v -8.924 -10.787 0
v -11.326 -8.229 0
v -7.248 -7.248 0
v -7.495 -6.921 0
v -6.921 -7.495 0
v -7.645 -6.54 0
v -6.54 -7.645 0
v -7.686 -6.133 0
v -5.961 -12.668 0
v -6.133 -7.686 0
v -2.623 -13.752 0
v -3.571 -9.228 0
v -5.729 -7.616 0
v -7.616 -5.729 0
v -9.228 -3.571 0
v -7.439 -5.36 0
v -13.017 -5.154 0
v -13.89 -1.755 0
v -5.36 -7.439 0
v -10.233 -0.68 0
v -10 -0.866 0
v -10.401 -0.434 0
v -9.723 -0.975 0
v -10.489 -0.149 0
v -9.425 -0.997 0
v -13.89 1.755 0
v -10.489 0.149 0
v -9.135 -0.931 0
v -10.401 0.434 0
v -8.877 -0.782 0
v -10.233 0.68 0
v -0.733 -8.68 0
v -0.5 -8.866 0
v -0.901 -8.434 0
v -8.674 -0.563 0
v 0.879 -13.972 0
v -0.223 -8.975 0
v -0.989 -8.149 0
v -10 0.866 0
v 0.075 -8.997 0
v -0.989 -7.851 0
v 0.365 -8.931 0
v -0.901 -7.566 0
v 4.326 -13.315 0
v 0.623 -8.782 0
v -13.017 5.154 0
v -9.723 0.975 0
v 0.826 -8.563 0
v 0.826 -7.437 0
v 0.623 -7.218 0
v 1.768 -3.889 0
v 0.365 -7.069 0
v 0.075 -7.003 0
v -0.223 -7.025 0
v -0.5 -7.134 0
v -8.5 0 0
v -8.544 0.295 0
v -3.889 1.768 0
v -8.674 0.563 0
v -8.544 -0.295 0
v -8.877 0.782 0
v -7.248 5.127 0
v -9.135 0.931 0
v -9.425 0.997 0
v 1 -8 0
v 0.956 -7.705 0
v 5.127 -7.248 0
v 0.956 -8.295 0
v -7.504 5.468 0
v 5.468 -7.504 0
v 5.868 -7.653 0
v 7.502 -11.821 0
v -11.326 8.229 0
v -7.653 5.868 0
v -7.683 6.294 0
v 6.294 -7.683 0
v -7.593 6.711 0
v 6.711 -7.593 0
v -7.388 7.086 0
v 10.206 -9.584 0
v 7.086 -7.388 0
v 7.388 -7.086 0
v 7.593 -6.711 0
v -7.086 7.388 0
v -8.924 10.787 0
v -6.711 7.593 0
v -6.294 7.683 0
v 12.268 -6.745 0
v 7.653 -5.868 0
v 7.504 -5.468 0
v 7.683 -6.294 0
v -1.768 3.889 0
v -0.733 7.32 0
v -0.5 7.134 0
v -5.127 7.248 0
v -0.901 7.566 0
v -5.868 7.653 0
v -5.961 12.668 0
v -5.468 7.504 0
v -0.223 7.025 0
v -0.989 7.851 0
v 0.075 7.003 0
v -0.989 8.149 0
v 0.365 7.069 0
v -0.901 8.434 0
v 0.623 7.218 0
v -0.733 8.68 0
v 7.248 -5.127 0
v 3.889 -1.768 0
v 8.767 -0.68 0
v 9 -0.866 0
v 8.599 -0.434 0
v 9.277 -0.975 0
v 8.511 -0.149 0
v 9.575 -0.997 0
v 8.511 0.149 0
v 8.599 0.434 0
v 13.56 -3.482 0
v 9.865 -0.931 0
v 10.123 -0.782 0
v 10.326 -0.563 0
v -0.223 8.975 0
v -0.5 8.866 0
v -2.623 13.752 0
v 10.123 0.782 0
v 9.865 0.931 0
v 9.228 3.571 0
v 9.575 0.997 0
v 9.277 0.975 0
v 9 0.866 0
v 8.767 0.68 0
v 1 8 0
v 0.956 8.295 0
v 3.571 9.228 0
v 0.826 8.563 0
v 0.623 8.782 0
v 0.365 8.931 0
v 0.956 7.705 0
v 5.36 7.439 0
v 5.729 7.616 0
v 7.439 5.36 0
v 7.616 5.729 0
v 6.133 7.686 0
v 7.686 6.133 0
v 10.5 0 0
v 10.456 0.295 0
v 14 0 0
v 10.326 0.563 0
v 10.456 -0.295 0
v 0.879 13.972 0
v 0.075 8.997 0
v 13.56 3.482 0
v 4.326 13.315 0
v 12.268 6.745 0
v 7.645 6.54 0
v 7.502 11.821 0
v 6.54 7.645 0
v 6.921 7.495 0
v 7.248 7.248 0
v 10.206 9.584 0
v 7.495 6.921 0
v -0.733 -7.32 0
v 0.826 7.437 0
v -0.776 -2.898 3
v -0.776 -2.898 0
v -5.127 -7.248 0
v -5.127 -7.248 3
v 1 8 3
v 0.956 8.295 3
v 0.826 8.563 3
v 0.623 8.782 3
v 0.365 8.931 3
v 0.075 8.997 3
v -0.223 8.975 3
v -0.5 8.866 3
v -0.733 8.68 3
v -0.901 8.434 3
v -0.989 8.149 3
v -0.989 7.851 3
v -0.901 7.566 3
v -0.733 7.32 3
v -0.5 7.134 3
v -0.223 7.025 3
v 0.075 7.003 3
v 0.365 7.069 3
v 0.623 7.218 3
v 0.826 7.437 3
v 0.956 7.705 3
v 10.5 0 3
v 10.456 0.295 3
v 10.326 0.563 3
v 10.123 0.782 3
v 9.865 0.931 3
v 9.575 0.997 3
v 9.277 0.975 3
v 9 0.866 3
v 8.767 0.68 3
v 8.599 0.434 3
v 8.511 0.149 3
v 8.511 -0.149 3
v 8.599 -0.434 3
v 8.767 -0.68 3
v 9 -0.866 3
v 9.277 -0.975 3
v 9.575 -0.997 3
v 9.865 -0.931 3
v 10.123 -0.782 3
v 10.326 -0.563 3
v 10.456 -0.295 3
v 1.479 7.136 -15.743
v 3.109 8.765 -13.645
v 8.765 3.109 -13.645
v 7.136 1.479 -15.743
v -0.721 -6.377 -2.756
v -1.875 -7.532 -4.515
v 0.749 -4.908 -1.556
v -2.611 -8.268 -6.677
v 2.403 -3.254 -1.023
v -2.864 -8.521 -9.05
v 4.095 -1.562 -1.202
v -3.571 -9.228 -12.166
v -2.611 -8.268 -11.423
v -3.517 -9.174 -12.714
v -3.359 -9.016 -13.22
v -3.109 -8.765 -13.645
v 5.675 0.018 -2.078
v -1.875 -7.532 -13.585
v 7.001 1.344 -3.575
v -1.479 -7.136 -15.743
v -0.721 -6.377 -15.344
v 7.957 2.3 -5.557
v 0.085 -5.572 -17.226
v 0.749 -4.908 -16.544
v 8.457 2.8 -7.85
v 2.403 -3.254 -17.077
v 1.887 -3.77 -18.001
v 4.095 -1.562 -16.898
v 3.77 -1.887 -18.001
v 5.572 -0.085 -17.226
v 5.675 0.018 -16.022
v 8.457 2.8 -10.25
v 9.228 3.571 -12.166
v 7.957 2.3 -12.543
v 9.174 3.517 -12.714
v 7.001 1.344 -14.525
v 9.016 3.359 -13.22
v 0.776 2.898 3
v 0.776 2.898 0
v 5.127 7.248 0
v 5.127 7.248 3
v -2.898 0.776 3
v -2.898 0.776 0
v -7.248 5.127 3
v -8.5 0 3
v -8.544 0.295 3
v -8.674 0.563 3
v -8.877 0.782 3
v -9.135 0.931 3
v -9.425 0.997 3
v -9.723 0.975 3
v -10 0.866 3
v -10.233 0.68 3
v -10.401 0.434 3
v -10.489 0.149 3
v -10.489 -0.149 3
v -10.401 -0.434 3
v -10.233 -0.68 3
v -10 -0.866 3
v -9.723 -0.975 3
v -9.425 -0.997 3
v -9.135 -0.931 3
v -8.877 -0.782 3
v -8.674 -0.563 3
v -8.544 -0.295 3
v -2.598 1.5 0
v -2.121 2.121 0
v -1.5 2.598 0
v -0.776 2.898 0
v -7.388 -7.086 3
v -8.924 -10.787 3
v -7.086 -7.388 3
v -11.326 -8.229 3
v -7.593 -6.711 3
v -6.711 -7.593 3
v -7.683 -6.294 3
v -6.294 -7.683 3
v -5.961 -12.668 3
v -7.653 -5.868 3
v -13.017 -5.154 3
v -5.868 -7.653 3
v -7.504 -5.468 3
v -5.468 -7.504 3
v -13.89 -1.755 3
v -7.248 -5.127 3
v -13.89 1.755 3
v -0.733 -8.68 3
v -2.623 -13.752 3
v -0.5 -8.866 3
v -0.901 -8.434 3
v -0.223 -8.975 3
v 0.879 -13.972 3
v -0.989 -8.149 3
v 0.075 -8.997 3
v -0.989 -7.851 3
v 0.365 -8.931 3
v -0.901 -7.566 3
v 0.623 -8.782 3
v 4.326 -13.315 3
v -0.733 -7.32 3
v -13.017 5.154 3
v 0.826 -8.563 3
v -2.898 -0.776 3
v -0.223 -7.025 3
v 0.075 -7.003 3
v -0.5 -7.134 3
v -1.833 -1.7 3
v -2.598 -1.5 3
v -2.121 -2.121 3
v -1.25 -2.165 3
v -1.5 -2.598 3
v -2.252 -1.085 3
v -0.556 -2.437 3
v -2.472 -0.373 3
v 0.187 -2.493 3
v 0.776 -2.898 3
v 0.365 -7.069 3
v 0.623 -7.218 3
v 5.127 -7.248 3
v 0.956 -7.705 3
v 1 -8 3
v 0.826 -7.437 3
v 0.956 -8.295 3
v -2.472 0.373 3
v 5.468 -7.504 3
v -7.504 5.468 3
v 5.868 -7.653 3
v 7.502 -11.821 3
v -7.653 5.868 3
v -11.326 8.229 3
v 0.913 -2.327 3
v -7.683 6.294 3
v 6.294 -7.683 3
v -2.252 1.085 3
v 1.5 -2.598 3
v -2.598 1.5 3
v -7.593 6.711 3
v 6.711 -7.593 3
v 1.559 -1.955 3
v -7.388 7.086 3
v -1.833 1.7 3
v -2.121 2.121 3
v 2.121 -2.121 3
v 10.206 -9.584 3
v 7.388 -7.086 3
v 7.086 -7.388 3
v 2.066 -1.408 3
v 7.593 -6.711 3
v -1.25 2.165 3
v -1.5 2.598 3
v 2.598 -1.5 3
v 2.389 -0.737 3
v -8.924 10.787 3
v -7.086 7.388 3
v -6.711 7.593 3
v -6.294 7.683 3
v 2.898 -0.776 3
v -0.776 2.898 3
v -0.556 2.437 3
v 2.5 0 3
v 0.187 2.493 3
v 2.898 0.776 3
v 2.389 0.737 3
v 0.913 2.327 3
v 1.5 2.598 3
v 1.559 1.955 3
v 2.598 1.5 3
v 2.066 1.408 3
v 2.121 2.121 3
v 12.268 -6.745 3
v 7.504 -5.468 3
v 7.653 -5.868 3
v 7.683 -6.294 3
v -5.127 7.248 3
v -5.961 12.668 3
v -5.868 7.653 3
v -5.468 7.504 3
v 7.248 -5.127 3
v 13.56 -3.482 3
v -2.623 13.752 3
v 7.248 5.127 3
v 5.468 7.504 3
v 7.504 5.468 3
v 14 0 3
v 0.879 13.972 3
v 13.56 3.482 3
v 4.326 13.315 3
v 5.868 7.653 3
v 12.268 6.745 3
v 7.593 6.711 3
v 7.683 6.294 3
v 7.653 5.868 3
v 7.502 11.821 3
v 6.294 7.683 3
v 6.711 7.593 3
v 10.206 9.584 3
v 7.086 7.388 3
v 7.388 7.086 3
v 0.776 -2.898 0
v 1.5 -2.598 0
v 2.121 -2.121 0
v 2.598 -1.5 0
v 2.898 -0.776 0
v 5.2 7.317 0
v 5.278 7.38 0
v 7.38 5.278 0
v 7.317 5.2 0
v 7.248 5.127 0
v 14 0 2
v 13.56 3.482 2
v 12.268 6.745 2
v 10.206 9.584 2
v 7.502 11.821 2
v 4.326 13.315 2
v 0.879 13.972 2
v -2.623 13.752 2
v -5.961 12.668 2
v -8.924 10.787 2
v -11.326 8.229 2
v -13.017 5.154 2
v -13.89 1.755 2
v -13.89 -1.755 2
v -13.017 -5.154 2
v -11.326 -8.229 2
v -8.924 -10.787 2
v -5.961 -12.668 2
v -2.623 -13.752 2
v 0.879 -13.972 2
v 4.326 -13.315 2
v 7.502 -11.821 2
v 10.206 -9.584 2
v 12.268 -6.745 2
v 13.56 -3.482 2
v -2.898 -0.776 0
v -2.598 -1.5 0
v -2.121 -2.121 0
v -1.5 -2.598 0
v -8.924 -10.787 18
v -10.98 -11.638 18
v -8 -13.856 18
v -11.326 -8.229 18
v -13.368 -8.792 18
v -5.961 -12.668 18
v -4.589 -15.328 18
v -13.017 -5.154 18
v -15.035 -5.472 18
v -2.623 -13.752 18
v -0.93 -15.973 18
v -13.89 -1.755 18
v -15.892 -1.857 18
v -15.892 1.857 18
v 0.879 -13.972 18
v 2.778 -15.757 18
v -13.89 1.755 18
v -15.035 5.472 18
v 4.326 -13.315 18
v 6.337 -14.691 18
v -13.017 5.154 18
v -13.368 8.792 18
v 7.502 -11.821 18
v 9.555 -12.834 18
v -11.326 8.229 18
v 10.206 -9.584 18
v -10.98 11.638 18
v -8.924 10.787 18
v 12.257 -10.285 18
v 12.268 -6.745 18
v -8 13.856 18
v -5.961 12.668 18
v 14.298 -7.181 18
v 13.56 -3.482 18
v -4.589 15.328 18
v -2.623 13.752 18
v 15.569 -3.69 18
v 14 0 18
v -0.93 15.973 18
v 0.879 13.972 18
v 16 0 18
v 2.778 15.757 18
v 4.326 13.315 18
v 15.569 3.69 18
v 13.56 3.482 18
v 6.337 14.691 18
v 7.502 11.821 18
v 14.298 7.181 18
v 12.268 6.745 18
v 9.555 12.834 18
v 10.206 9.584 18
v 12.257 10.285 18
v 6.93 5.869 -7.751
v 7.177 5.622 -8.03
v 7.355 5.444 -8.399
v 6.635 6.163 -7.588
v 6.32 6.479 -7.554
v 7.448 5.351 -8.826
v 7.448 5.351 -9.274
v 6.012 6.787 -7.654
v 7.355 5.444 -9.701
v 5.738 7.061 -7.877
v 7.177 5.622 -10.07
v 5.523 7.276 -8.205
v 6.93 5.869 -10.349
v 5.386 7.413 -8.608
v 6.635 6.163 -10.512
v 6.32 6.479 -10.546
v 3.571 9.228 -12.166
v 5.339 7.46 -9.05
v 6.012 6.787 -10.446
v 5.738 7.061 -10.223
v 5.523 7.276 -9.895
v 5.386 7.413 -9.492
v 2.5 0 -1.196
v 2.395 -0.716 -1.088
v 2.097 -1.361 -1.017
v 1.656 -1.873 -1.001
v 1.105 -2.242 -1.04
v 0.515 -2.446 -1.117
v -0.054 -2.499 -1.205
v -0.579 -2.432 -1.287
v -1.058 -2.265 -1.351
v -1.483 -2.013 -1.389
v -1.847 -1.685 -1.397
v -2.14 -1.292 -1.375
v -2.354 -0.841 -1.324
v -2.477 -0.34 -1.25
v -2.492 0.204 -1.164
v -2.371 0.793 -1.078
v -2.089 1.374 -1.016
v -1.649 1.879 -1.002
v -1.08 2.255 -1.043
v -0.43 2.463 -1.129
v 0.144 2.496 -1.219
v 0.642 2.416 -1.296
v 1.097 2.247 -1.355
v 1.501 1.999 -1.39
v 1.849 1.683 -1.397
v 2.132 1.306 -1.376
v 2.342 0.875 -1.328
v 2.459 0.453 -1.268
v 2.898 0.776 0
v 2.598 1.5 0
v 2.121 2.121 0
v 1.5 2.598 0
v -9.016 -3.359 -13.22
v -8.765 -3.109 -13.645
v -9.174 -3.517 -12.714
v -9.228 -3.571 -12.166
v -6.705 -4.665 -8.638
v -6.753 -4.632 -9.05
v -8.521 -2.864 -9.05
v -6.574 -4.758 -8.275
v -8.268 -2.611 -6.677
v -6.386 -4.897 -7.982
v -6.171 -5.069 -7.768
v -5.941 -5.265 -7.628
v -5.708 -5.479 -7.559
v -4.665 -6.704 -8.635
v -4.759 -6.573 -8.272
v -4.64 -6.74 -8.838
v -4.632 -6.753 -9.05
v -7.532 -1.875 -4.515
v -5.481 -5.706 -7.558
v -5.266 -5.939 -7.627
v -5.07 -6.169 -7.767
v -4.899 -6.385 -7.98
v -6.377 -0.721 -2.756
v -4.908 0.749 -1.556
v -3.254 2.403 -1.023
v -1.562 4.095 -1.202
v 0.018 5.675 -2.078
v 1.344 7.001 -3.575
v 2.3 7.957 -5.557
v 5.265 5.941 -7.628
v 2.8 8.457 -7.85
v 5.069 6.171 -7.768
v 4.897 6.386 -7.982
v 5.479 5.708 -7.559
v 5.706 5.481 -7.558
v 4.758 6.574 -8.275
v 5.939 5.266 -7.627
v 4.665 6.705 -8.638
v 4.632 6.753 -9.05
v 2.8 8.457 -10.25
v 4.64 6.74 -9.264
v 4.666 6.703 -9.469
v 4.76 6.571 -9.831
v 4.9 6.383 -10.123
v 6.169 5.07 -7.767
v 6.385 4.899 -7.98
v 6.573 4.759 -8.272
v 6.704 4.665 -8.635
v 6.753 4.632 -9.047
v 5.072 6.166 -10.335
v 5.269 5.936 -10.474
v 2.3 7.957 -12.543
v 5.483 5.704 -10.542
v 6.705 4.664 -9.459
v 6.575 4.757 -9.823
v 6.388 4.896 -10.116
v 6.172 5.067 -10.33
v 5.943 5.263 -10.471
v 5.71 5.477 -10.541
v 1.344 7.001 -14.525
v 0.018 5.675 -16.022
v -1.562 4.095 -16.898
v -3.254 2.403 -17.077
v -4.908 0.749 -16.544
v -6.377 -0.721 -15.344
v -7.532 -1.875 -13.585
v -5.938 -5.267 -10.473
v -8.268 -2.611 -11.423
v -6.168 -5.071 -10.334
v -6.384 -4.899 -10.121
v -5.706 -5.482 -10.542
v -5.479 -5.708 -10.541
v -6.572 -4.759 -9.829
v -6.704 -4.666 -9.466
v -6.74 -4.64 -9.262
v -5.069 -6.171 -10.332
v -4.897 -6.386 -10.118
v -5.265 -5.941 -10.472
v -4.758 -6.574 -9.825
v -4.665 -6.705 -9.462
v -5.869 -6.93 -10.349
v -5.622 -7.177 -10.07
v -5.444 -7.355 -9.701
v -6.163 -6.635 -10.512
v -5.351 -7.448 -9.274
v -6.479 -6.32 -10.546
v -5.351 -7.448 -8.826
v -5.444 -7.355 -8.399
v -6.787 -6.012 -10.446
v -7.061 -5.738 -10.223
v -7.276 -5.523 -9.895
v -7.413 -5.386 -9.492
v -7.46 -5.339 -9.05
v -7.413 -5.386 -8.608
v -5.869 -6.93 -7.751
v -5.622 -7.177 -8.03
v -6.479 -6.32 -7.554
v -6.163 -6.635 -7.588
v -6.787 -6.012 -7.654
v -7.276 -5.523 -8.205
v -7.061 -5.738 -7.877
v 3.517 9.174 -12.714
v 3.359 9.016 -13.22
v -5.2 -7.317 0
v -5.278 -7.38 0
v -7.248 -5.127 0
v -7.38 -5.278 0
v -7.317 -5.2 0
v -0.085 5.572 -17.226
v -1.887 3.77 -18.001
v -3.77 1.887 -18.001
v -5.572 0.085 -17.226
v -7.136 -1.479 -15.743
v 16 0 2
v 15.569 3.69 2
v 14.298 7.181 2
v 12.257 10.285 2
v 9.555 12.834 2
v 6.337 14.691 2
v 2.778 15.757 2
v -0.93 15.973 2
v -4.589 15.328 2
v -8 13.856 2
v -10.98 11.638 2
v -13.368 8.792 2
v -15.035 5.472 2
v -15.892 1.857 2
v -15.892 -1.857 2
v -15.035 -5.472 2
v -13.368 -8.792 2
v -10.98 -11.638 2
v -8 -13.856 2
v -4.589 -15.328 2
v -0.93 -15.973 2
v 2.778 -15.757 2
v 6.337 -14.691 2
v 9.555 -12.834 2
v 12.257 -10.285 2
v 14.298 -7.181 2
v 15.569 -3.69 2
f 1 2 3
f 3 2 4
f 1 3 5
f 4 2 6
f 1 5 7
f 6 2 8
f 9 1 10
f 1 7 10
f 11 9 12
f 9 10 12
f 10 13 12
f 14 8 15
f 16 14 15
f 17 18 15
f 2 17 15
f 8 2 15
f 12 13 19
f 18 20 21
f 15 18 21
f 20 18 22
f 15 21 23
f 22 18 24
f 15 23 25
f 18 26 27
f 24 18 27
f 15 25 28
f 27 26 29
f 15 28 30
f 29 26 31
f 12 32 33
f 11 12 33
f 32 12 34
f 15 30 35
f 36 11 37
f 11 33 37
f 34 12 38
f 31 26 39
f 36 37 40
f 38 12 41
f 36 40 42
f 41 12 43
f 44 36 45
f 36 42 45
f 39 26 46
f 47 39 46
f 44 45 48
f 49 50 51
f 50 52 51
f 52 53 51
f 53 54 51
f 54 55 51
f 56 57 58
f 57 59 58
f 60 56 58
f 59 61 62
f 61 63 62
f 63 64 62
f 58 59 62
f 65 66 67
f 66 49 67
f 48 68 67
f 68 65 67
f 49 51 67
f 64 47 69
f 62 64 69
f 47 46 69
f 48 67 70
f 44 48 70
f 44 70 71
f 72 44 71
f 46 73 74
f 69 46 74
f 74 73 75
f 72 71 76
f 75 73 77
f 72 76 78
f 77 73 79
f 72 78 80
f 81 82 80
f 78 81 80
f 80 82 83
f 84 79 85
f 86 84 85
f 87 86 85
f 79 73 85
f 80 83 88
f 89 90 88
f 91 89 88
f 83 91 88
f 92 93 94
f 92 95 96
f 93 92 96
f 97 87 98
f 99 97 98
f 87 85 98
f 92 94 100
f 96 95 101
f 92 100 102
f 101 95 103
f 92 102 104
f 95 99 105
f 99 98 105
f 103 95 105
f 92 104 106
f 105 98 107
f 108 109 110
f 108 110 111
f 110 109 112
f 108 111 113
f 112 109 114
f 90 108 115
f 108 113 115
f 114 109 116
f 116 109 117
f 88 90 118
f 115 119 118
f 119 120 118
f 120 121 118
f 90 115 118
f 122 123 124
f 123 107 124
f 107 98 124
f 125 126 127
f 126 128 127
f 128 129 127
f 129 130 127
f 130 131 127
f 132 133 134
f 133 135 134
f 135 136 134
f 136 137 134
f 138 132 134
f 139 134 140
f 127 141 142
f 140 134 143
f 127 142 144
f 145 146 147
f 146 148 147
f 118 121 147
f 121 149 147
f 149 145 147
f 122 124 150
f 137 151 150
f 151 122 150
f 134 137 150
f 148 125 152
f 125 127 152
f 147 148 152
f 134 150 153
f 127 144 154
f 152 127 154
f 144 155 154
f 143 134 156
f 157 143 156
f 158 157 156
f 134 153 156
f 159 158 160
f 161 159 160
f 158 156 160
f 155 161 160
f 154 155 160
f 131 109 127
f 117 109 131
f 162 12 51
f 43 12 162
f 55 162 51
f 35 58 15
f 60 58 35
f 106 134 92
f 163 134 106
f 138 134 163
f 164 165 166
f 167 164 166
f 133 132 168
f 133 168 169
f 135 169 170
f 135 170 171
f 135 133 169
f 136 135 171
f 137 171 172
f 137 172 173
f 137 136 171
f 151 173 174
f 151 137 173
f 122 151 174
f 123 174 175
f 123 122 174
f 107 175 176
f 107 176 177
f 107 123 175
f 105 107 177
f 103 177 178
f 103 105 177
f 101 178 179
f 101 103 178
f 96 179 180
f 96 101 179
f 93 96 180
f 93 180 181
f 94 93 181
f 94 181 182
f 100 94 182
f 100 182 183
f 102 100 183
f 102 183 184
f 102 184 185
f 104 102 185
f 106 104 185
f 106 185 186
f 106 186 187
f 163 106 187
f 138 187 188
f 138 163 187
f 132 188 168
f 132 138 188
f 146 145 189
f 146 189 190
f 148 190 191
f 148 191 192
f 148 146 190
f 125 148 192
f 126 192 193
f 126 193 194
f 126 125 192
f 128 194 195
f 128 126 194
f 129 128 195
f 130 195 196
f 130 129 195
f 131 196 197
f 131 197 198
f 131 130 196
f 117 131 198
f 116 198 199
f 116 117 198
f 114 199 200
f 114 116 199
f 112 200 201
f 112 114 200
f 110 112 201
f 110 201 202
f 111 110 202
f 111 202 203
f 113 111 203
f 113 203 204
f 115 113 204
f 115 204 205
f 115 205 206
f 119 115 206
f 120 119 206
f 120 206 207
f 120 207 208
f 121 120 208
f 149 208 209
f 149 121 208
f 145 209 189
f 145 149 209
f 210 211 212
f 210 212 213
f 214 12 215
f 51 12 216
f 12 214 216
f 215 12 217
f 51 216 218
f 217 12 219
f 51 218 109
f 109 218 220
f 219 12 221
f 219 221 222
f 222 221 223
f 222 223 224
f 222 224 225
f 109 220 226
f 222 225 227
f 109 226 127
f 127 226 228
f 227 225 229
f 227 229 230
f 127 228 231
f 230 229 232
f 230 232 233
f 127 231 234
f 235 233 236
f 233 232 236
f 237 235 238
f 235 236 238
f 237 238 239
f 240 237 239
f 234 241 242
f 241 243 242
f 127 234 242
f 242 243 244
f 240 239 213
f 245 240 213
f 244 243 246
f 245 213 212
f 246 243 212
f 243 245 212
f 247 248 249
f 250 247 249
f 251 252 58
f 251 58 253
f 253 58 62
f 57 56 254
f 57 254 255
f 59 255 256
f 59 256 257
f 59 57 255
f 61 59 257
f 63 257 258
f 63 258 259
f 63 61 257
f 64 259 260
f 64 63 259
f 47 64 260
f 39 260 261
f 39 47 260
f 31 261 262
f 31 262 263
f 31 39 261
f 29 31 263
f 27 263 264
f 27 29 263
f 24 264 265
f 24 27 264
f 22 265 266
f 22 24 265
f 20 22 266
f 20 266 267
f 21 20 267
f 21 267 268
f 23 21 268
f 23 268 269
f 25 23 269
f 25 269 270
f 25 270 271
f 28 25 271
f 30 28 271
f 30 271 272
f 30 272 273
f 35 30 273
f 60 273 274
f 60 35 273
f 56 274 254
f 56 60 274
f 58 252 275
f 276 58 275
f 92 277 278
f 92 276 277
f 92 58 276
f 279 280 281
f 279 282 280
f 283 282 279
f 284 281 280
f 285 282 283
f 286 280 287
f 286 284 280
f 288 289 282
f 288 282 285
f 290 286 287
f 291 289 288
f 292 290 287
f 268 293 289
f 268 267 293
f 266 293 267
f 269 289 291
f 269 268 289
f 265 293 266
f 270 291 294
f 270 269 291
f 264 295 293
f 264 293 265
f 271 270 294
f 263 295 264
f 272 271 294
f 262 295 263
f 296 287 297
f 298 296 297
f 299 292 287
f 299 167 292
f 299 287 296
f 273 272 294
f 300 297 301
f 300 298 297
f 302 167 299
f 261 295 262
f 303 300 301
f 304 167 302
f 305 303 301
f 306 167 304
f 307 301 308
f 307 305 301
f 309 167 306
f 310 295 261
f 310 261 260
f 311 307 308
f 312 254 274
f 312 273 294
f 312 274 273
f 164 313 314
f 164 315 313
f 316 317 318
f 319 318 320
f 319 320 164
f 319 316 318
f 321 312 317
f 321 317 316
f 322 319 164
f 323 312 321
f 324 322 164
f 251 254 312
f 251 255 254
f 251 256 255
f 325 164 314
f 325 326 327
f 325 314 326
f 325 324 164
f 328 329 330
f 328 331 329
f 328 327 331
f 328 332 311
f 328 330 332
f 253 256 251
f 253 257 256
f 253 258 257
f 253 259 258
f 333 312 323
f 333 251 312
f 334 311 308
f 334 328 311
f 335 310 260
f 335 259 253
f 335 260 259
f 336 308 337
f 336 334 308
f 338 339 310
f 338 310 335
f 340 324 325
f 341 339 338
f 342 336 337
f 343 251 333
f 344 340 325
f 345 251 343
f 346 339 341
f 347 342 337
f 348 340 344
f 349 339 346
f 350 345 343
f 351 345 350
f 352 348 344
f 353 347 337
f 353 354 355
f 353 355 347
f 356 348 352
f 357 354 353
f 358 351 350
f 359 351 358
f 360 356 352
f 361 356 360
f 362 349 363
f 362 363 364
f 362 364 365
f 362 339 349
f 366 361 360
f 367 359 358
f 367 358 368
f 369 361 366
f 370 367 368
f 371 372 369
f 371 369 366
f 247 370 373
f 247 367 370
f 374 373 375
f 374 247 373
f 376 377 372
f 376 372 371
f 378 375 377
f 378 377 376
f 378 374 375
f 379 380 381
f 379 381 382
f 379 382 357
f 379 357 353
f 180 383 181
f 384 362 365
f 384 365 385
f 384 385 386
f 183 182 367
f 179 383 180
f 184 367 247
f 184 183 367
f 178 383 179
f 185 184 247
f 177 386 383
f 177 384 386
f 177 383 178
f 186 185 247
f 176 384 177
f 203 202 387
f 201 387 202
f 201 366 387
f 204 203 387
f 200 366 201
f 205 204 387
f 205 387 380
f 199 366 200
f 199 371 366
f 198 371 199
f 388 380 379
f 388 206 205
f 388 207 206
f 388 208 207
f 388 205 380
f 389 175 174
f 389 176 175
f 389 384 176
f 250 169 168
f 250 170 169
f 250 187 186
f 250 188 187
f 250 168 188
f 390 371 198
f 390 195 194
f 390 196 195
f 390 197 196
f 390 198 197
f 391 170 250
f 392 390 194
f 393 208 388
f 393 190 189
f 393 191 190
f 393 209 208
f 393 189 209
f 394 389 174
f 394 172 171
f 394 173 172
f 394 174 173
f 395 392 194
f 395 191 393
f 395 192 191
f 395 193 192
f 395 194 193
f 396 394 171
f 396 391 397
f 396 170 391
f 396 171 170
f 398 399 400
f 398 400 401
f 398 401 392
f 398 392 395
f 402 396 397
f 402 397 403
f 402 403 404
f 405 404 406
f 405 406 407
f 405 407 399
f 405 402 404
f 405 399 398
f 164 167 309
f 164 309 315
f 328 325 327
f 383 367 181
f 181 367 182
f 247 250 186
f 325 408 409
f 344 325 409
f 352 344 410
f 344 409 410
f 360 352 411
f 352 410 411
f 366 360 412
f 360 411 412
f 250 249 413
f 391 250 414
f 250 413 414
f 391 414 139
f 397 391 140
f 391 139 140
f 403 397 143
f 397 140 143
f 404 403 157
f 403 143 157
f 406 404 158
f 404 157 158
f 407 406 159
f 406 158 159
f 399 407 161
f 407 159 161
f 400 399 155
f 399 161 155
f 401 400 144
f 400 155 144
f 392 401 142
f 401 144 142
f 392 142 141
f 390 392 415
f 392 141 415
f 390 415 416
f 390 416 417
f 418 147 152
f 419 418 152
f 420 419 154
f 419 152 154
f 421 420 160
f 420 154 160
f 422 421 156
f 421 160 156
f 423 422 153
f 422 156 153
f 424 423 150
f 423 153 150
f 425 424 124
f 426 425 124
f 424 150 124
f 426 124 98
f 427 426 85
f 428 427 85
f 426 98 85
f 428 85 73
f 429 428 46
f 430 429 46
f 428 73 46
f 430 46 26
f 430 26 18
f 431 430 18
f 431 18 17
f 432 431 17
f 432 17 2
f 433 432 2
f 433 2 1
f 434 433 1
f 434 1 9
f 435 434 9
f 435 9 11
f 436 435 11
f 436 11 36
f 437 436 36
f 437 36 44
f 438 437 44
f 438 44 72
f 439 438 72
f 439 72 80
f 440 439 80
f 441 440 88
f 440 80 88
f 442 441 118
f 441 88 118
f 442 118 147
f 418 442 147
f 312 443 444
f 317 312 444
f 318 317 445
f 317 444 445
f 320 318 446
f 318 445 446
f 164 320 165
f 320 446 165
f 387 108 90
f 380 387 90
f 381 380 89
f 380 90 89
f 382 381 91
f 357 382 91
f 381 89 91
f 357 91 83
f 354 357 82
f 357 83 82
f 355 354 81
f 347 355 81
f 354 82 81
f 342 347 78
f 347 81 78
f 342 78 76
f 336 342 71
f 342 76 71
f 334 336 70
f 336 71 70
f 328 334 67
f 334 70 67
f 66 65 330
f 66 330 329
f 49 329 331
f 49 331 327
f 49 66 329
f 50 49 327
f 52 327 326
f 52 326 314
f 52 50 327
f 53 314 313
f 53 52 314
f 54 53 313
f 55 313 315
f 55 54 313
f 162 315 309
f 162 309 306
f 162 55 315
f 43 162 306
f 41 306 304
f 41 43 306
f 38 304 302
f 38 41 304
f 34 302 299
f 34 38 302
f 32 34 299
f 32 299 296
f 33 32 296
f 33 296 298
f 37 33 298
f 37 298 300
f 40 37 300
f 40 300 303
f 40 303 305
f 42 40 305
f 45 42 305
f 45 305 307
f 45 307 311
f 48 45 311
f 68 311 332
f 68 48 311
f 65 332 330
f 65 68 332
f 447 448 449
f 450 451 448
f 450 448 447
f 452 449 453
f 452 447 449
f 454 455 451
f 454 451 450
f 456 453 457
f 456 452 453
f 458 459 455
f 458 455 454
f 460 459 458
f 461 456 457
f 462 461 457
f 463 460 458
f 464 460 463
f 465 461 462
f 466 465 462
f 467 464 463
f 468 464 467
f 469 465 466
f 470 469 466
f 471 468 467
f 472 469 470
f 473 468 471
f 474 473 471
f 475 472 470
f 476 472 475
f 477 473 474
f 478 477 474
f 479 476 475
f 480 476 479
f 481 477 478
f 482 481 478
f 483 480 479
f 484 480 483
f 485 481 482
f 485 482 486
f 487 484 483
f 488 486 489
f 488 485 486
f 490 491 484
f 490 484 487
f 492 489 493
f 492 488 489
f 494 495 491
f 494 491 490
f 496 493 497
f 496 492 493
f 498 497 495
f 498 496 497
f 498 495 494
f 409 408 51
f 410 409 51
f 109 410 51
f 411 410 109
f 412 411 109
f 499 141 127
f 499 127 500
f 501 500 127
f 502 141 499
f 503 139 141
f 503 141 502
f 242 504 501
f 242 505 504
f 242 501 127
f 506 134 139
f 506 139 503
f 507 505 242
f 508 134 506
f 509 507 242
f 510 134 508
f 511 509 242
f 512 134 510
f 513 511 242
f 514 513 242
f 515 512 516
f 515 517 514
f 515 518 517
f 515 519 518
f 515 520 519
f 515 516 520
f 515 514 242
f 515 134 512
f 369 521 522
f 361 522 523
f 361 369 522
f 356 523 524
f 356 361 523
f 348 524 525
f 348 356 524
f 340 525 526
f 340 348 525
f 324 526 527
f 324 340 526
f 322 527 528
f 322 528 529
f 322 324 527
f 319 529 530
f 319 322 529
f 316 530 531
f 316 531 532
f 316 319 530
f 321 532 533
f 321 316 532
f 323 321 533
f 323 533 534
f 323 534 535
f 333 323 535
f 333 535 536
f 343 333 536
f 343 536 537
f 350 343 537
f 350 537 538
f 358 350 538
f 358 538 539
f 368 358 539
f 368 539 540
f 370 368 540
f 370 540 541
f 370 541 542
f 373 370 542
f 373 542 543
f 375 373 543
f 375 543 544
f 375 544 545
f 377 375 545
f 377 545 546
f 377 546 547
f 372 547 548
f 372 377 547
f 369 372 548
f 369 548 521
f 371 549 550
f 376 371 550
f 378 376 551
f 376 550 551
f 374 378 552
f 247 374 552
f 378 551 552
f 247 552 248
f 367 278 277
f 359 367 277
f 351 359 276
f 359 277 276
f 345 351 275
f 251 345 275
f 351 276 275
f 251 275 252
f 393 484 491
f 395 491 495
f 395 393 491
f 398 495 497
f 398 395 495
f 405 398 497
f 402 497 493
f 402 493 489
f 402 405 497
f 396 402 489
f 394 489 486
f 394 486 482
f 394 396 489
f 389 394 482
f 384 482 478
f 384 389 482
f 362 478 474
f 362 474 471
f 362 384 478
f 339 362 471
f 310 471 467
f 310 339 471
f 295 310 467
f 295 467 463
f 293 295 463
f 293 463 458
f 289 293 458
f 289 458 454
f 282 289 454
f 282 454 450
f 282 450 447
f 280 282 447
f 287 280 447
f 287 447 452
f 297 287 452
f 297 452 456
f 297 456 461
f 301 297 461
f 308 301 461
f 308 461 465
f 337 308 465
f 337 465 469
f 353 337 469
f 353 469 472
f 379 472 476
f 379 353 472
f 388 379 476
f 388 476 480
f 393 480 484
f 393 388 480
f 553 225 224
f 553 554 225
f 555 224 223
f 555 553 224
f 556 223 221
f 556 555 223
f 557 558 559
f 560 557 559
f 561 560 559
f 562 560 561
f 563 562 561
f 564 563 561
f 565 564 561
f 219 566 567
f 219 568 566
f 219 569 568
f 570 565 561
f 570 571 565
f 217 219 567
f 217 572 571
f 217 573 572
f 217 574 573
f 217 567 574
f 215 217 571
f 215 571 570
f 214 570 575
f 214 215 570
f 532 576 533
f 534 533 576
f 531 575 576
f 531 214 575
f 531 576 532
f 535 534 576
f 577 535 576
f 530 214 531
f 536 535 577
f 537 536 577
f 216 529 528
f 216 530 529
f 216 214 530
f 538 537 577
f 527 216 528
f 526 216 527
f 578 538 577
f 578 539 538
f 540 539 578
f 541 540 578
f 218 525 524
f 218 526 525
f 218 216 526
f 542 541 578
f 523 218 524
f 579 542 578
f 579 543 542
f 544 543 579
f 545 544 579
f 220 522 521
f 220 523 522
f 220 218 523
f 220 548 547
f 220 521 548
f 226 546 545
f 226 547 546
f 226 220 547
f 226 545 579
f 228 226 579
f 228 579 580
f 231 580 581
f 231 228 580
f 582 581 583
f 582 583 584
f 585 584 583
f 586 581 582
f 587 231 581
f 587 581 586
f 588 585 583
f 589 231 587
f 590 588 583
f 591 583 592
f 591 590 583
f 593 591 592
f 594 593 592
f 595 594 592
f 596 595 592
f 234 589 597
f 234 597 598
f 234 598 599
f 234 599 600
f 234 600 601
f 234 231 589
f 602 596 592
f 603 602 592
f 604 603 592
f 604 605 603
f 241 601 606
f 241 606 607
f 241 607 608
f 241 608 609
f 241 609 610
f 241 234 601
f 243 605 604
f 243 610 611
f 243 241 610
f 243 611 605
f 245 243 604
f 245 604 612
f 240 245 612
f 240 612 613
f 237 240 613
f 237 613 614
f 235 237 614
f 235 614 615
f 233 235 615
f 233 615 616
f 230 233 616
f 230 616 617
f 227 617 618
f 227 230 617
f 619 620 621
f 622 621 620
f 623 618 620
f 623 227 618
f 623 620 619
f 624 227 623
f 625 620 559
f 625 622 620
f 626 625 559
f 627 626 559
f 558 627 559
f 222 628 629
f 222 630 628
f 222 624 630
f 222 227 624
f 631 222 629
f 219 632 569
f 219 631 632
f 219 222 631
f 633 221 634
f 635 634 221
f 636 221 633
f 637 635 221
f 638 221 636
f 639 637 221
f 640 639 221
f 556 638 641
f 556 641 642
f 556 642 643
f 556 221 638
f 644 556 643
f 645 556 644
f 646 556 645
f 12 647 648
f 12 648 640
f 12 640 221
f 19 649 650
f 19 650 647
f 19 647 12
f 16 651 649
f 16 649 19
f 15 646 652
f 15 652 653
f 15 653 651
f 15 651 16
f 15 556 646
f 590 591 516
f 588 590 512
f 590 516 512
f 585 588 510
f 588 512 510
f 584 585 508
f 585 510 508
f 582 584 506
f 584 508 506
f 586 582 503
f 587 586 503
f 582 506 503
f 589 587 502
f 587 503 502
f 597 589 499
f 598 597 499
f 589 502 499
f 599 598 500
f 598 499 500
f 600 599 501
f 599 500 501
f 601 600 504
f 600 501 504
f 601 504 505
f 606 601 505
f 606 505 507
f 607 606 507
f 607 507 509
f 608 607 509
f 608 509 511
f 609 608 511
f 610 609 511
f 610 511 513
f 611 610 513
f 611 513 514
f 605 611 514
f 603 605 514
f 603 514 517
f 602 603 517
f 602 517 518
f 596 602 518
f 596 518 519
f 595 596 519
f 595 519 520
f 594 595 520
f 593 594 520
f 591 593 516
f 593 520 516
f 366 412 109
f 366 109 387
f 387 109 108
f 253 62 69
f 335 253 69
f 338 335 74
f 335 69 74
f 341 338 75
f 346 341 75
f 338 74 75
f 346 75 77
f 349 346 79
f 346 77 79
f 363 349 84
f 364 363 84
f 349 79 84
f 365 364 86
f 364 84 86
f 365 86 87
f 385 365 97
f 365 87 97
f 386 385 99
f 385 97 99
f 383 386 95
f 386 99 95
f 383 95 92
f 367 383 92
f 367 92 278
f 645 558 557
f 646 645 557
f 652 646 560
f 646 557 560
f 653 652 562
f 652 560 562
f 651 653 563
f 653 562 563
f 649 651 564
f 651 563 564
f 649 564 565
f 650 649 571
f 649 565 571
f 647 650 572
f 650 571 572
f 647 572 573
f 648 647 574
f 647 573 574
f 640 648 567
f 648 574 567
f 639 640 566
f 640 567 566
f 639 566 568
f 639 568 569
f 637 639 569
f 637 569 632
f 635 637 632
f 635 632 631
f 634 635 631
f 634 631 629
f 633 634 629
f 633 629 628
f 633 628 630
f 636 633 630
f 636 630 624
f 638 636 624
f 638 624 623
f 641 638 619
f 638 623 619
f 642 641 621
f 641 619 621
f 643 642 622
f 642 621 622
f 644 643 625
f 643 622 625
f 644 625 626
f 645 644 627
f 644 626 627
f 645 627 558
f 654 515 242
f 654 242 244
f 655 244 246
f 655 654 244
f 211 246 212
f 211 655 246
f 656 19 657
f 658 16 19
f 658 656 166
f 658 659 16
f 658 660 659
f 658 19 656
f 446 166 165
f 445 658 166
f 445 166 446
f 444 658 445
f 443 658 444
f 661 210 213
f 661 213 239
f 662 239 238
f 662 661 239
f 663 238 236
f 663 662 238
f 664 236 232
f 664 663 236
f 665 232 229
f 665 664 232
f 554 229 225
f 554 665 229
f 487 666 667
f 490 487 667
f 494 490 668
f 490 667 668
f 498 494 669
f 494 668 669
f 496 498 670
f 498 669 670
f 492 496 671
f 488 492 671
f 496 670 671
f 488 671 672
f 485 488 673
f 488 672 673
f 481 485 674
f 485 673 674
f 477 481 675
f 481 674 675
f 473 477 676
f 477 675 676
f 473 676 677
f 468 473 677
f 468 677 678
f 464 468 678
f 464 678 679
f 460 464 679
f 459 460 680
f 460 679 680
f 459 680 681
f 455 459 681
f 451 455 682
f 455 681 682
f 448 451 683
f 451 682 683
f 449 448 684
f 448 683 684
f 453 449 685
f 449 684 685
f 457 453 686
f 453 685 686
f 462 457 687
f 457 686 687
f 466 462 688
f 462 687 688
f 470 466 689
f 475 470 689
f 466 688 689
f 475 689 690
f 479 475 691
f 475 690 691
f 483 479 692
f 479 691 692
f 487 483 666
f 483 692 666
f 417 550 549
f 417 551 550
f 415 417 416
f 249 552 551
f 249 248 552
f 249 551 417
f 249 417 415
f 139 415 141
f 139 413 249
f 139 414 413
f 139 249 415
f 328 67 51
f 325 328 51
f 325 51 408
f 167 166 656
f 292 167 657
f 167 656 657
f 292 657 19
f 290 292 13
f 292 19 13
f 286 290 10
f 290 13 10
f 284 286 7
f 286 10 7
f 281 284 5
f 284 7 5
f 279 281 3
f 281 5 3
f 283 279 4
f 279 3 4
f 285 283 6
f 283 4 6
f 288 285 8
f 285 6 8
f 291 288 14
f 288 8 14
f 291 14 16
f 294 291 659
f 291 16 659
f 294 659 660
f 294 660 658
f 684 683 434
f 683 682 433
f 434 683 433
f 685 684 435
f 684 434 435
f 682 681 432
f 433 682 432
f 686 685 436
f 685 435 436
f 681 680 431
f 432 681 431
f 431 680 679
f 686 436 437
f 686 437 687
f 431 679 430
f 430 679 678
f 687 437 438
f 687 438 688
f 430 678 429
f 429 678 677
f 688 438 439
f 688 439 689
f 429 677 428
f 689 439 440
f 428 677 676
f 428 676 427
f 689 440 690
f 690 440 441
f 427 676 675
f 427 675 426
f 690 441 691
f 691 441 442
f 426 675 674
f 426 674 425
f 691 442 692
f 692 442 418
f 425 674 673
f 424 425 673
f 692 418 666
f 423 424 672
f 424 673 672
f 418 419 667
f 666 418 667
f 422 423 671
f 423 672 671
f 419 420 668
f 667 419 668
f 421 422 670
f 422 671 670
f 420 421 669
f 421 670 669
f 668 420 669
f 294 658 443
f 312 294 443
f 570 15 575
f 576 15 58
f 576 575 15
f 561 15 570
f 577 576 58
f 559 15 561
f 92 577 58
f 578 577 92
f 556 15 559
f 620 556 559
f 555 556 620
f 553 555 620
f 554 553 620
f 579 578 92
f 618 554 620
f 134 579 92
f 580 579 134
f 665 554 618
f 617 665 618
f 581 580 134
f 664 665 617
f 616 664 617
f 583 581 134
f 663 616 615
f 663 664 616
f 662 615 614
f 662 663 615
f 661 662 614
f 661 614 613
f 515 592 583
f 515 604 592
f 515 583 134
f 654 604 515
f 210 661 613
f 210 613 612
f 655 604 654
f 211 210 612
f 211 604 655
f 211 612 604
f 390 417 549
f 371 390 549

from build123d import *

# Parameters (mm, degrees)
SKETCH1_R                = 14
SKETCH1_R_2              = 1
SKETCH1_R_3              = 3
BOSS_EXTRUDE1_DEPTH      = 3
BOSS_EXTRUDE2_DEPTH      = 15
BOSS_EXTRUDE2_DEPTH_BACK = 1
SKETCH2_R                = 16
SKETCH2_R_2              = 14
SKETCH3_R                = 8.05
BOSS_EXTRUDE3_DEPTH      = 4
CUT_EXTRUDE1_DEPTH       = 10
CUT_EXTRUDE1_DEPTH_BACK  = 30
SKETCH4_R                = 2.5
SKETCH5_R                = 1.5
CUT_EXTRUDE2_DEPTH       = 37.483814873


with BuildPart() as part:
    # Sketch1 → Boss-Extrude1 (new body)
    # profile 1 of 2: a face of its own
    with BuildSketch(Plane.XY):
        Circle(SKETCH1_R)
        with Locations((0, -8)):
            Circle(SKETCH1_R_2, mode=Mode.SUBTRACT)
        with BuildLine():
            ThreePointArc((7.247844507, -5.126524164), (7.247844507, -7.247844507), (5.126524164, -7.247844507))
            Line((5.126524164, -7.247844507), (0.776457135, -2.897777479))
            ThreePointArc((0.776457135, -2.897777479), (0, -3), (-0.776457135, -2.897777479))
            Line((-0.776457135, -2.897777479), (-5.126524164, -7.247844507))
            ThreePointArc((-5.126524164, -7.247844507), (-7.247844507, -7.247844507), (-7.247844507, -5.126524164))
            Line((-7.247844507, -5.126524164), (-2.897777479, -0.776457135))
            ThreePointArc((-2.897777479, -0.776457135), (-3, 0), (-2.897777479, 0.776457135))
            Line((-2.897777479, 0.776457135), (-7.247844507, 5.126524164))
            ThreePointArc((-7.247844507, 5.126524164), (-7.247844507, 7.247844507), (-5.126524164, 7.247844507))
            Line((-5.126524164, 7.247844507), (-0.776457135, 2.897777479))
            ThreePointArc((-0.776457135, 2.897777479), (0, 3), (0.776457135, 2.897777479))
            Line((0.776457135, 2.897777479), (5.126524164, 7.247844507))
            ThreePointArc((5.126524164, 7.247844507), (7.247844507, 7.247844507), (7.247844507, 5.126524164))
            Line((7.247844507, 5.126524164), (2.897777479, 0.776457135))
            ThreePointArc((2.897777479, 0.776457135), (2.974334584, 0.391578577), (3, 0))
            ThreePointArc((3, 0), (2.974334584, -0.391578577), (2.897777479, -0.776457135))
            Line((2.897777479, -0.776457135), (7.247844507, -5.126524164))
        make_face(mode=Mode.SUBTRACT)
        with Locations((-9.5, 0)):
            Circle(SKETCH1_R_2, mode=Mode.SUBTRACT)
        with Locations((9.5, 0)):
            Circle(SKETCH1_R_2, mode=Mode.SUBTRACT)
        with Locations((0, 8)):
            Circle(SKETCH1_R_2, mode=Mode.SUBTRACT)
    # profile 2 of 2: a face of its own
    with BuildSketch(Plane.XY):
        Circle(SKETCH1_R_3)
    extrude(amount=BOSS_EXTRUDE1_DEPTH)

    # Sketch2 → Boss-Extrude2 (add, two sides: drawn at the far end of the back side and taken through both)
    with BuildSketch(Plane.XY.offset(3).offset(-BOSS_EXTRUDE2_DEPTH_BACK)):
        Circle(SKETCH2_R)
        Circle(SKETCH2_R_2, mode=Mode.SUBTRACT)
    extrude(amount=BOSS_EXTRUDE2_DEPTH + BOSS_EXTRUDE2_DEPTH_BACK)

    # Sketch3 → Boss-Extrude3 (add, symmetric)
    with BuildSketch(Plane(origin=(0, 0, 0), x_dir=(0.7071067811865477, 0.7071067811865475, 0), z_dir=(-0.7071067811865475, 0.7071067811865477, 0))):
        with BuildLine():
            Line((-9.05, 9.05), (-9.05, 0))
            Line((-9.05, 0), (9.05, 0))
            Line((9.05, 0), (9.05, 9.05))
            Line((9.05, 9.05), (9.05, 12.166022099))
            ThreePointArc((9.05, 12.166022099), (8.879286309, 12.974546435), (8.396288399, 13.645044596))
            Line((8.396288399, 13.645044596), (6.091955006, 15.742576798))
            ThreePointArc((6.091955006, 15.742576798), (0, 18.1), (-6.091955006, 15.742576798))
            Line((-6.091955006, 15.742576798), (-8.396288399, 13.645044596))
            ThreePointArc((-8.396288399, 13.645044596), (-8.879286309, 12.974546435), (-9.05, 12.166022099))
            Line((-9.05, 12.166022099), (-9.05, 9.05))
        make_face()
        with Locations(Location((0, 9.05, 0), (0, 0, 180))):
            Circle(SKETCH3_R, mode=Mode.SUBTRACT)
    extrude(amount=BOSS_EXTRUDE3_DEPTH, both=True)

    # Sketch4 → Cut-Extrude1 (cut, two sides: drawn at the far end of the back side and taken through both)
    with BuildSketch(Plane(origin=(0, 0, 0), x_dir=(-1, 0, 0), z_dir=(0, 0, -1)).offset(-CUT_EXTRUDE1_DEPTH_BACK)):
        with Locations(Location((0, 0, 0), (0, 0, 180))):
            Circle(SKETCH4_R)
    extrude(amount=CUT_EXTRUDE1_DEPTH + CUT_EXTRUDE1_DEPTH_BACK, mode=Mode.SUBTRACT)

    # Sketch5 → Cut-Extrude2 (cut, through all)
    with BuildSketch(Plane(origin=(6.39931637, 6.39931637, 0), x_dir=(0, 0, -1), z_dir=(0.7071067811865476, 0.7071067811865476, 0))):
        with Locations(Location((9.05, 0, 0), (0, 0, 90))):
            Circle(SKETCH5_R)
    extrude(amount=-CUT_EXTRUDE2_DEPTH, mode=Mode.SUBTRACT)


solid = part.part
